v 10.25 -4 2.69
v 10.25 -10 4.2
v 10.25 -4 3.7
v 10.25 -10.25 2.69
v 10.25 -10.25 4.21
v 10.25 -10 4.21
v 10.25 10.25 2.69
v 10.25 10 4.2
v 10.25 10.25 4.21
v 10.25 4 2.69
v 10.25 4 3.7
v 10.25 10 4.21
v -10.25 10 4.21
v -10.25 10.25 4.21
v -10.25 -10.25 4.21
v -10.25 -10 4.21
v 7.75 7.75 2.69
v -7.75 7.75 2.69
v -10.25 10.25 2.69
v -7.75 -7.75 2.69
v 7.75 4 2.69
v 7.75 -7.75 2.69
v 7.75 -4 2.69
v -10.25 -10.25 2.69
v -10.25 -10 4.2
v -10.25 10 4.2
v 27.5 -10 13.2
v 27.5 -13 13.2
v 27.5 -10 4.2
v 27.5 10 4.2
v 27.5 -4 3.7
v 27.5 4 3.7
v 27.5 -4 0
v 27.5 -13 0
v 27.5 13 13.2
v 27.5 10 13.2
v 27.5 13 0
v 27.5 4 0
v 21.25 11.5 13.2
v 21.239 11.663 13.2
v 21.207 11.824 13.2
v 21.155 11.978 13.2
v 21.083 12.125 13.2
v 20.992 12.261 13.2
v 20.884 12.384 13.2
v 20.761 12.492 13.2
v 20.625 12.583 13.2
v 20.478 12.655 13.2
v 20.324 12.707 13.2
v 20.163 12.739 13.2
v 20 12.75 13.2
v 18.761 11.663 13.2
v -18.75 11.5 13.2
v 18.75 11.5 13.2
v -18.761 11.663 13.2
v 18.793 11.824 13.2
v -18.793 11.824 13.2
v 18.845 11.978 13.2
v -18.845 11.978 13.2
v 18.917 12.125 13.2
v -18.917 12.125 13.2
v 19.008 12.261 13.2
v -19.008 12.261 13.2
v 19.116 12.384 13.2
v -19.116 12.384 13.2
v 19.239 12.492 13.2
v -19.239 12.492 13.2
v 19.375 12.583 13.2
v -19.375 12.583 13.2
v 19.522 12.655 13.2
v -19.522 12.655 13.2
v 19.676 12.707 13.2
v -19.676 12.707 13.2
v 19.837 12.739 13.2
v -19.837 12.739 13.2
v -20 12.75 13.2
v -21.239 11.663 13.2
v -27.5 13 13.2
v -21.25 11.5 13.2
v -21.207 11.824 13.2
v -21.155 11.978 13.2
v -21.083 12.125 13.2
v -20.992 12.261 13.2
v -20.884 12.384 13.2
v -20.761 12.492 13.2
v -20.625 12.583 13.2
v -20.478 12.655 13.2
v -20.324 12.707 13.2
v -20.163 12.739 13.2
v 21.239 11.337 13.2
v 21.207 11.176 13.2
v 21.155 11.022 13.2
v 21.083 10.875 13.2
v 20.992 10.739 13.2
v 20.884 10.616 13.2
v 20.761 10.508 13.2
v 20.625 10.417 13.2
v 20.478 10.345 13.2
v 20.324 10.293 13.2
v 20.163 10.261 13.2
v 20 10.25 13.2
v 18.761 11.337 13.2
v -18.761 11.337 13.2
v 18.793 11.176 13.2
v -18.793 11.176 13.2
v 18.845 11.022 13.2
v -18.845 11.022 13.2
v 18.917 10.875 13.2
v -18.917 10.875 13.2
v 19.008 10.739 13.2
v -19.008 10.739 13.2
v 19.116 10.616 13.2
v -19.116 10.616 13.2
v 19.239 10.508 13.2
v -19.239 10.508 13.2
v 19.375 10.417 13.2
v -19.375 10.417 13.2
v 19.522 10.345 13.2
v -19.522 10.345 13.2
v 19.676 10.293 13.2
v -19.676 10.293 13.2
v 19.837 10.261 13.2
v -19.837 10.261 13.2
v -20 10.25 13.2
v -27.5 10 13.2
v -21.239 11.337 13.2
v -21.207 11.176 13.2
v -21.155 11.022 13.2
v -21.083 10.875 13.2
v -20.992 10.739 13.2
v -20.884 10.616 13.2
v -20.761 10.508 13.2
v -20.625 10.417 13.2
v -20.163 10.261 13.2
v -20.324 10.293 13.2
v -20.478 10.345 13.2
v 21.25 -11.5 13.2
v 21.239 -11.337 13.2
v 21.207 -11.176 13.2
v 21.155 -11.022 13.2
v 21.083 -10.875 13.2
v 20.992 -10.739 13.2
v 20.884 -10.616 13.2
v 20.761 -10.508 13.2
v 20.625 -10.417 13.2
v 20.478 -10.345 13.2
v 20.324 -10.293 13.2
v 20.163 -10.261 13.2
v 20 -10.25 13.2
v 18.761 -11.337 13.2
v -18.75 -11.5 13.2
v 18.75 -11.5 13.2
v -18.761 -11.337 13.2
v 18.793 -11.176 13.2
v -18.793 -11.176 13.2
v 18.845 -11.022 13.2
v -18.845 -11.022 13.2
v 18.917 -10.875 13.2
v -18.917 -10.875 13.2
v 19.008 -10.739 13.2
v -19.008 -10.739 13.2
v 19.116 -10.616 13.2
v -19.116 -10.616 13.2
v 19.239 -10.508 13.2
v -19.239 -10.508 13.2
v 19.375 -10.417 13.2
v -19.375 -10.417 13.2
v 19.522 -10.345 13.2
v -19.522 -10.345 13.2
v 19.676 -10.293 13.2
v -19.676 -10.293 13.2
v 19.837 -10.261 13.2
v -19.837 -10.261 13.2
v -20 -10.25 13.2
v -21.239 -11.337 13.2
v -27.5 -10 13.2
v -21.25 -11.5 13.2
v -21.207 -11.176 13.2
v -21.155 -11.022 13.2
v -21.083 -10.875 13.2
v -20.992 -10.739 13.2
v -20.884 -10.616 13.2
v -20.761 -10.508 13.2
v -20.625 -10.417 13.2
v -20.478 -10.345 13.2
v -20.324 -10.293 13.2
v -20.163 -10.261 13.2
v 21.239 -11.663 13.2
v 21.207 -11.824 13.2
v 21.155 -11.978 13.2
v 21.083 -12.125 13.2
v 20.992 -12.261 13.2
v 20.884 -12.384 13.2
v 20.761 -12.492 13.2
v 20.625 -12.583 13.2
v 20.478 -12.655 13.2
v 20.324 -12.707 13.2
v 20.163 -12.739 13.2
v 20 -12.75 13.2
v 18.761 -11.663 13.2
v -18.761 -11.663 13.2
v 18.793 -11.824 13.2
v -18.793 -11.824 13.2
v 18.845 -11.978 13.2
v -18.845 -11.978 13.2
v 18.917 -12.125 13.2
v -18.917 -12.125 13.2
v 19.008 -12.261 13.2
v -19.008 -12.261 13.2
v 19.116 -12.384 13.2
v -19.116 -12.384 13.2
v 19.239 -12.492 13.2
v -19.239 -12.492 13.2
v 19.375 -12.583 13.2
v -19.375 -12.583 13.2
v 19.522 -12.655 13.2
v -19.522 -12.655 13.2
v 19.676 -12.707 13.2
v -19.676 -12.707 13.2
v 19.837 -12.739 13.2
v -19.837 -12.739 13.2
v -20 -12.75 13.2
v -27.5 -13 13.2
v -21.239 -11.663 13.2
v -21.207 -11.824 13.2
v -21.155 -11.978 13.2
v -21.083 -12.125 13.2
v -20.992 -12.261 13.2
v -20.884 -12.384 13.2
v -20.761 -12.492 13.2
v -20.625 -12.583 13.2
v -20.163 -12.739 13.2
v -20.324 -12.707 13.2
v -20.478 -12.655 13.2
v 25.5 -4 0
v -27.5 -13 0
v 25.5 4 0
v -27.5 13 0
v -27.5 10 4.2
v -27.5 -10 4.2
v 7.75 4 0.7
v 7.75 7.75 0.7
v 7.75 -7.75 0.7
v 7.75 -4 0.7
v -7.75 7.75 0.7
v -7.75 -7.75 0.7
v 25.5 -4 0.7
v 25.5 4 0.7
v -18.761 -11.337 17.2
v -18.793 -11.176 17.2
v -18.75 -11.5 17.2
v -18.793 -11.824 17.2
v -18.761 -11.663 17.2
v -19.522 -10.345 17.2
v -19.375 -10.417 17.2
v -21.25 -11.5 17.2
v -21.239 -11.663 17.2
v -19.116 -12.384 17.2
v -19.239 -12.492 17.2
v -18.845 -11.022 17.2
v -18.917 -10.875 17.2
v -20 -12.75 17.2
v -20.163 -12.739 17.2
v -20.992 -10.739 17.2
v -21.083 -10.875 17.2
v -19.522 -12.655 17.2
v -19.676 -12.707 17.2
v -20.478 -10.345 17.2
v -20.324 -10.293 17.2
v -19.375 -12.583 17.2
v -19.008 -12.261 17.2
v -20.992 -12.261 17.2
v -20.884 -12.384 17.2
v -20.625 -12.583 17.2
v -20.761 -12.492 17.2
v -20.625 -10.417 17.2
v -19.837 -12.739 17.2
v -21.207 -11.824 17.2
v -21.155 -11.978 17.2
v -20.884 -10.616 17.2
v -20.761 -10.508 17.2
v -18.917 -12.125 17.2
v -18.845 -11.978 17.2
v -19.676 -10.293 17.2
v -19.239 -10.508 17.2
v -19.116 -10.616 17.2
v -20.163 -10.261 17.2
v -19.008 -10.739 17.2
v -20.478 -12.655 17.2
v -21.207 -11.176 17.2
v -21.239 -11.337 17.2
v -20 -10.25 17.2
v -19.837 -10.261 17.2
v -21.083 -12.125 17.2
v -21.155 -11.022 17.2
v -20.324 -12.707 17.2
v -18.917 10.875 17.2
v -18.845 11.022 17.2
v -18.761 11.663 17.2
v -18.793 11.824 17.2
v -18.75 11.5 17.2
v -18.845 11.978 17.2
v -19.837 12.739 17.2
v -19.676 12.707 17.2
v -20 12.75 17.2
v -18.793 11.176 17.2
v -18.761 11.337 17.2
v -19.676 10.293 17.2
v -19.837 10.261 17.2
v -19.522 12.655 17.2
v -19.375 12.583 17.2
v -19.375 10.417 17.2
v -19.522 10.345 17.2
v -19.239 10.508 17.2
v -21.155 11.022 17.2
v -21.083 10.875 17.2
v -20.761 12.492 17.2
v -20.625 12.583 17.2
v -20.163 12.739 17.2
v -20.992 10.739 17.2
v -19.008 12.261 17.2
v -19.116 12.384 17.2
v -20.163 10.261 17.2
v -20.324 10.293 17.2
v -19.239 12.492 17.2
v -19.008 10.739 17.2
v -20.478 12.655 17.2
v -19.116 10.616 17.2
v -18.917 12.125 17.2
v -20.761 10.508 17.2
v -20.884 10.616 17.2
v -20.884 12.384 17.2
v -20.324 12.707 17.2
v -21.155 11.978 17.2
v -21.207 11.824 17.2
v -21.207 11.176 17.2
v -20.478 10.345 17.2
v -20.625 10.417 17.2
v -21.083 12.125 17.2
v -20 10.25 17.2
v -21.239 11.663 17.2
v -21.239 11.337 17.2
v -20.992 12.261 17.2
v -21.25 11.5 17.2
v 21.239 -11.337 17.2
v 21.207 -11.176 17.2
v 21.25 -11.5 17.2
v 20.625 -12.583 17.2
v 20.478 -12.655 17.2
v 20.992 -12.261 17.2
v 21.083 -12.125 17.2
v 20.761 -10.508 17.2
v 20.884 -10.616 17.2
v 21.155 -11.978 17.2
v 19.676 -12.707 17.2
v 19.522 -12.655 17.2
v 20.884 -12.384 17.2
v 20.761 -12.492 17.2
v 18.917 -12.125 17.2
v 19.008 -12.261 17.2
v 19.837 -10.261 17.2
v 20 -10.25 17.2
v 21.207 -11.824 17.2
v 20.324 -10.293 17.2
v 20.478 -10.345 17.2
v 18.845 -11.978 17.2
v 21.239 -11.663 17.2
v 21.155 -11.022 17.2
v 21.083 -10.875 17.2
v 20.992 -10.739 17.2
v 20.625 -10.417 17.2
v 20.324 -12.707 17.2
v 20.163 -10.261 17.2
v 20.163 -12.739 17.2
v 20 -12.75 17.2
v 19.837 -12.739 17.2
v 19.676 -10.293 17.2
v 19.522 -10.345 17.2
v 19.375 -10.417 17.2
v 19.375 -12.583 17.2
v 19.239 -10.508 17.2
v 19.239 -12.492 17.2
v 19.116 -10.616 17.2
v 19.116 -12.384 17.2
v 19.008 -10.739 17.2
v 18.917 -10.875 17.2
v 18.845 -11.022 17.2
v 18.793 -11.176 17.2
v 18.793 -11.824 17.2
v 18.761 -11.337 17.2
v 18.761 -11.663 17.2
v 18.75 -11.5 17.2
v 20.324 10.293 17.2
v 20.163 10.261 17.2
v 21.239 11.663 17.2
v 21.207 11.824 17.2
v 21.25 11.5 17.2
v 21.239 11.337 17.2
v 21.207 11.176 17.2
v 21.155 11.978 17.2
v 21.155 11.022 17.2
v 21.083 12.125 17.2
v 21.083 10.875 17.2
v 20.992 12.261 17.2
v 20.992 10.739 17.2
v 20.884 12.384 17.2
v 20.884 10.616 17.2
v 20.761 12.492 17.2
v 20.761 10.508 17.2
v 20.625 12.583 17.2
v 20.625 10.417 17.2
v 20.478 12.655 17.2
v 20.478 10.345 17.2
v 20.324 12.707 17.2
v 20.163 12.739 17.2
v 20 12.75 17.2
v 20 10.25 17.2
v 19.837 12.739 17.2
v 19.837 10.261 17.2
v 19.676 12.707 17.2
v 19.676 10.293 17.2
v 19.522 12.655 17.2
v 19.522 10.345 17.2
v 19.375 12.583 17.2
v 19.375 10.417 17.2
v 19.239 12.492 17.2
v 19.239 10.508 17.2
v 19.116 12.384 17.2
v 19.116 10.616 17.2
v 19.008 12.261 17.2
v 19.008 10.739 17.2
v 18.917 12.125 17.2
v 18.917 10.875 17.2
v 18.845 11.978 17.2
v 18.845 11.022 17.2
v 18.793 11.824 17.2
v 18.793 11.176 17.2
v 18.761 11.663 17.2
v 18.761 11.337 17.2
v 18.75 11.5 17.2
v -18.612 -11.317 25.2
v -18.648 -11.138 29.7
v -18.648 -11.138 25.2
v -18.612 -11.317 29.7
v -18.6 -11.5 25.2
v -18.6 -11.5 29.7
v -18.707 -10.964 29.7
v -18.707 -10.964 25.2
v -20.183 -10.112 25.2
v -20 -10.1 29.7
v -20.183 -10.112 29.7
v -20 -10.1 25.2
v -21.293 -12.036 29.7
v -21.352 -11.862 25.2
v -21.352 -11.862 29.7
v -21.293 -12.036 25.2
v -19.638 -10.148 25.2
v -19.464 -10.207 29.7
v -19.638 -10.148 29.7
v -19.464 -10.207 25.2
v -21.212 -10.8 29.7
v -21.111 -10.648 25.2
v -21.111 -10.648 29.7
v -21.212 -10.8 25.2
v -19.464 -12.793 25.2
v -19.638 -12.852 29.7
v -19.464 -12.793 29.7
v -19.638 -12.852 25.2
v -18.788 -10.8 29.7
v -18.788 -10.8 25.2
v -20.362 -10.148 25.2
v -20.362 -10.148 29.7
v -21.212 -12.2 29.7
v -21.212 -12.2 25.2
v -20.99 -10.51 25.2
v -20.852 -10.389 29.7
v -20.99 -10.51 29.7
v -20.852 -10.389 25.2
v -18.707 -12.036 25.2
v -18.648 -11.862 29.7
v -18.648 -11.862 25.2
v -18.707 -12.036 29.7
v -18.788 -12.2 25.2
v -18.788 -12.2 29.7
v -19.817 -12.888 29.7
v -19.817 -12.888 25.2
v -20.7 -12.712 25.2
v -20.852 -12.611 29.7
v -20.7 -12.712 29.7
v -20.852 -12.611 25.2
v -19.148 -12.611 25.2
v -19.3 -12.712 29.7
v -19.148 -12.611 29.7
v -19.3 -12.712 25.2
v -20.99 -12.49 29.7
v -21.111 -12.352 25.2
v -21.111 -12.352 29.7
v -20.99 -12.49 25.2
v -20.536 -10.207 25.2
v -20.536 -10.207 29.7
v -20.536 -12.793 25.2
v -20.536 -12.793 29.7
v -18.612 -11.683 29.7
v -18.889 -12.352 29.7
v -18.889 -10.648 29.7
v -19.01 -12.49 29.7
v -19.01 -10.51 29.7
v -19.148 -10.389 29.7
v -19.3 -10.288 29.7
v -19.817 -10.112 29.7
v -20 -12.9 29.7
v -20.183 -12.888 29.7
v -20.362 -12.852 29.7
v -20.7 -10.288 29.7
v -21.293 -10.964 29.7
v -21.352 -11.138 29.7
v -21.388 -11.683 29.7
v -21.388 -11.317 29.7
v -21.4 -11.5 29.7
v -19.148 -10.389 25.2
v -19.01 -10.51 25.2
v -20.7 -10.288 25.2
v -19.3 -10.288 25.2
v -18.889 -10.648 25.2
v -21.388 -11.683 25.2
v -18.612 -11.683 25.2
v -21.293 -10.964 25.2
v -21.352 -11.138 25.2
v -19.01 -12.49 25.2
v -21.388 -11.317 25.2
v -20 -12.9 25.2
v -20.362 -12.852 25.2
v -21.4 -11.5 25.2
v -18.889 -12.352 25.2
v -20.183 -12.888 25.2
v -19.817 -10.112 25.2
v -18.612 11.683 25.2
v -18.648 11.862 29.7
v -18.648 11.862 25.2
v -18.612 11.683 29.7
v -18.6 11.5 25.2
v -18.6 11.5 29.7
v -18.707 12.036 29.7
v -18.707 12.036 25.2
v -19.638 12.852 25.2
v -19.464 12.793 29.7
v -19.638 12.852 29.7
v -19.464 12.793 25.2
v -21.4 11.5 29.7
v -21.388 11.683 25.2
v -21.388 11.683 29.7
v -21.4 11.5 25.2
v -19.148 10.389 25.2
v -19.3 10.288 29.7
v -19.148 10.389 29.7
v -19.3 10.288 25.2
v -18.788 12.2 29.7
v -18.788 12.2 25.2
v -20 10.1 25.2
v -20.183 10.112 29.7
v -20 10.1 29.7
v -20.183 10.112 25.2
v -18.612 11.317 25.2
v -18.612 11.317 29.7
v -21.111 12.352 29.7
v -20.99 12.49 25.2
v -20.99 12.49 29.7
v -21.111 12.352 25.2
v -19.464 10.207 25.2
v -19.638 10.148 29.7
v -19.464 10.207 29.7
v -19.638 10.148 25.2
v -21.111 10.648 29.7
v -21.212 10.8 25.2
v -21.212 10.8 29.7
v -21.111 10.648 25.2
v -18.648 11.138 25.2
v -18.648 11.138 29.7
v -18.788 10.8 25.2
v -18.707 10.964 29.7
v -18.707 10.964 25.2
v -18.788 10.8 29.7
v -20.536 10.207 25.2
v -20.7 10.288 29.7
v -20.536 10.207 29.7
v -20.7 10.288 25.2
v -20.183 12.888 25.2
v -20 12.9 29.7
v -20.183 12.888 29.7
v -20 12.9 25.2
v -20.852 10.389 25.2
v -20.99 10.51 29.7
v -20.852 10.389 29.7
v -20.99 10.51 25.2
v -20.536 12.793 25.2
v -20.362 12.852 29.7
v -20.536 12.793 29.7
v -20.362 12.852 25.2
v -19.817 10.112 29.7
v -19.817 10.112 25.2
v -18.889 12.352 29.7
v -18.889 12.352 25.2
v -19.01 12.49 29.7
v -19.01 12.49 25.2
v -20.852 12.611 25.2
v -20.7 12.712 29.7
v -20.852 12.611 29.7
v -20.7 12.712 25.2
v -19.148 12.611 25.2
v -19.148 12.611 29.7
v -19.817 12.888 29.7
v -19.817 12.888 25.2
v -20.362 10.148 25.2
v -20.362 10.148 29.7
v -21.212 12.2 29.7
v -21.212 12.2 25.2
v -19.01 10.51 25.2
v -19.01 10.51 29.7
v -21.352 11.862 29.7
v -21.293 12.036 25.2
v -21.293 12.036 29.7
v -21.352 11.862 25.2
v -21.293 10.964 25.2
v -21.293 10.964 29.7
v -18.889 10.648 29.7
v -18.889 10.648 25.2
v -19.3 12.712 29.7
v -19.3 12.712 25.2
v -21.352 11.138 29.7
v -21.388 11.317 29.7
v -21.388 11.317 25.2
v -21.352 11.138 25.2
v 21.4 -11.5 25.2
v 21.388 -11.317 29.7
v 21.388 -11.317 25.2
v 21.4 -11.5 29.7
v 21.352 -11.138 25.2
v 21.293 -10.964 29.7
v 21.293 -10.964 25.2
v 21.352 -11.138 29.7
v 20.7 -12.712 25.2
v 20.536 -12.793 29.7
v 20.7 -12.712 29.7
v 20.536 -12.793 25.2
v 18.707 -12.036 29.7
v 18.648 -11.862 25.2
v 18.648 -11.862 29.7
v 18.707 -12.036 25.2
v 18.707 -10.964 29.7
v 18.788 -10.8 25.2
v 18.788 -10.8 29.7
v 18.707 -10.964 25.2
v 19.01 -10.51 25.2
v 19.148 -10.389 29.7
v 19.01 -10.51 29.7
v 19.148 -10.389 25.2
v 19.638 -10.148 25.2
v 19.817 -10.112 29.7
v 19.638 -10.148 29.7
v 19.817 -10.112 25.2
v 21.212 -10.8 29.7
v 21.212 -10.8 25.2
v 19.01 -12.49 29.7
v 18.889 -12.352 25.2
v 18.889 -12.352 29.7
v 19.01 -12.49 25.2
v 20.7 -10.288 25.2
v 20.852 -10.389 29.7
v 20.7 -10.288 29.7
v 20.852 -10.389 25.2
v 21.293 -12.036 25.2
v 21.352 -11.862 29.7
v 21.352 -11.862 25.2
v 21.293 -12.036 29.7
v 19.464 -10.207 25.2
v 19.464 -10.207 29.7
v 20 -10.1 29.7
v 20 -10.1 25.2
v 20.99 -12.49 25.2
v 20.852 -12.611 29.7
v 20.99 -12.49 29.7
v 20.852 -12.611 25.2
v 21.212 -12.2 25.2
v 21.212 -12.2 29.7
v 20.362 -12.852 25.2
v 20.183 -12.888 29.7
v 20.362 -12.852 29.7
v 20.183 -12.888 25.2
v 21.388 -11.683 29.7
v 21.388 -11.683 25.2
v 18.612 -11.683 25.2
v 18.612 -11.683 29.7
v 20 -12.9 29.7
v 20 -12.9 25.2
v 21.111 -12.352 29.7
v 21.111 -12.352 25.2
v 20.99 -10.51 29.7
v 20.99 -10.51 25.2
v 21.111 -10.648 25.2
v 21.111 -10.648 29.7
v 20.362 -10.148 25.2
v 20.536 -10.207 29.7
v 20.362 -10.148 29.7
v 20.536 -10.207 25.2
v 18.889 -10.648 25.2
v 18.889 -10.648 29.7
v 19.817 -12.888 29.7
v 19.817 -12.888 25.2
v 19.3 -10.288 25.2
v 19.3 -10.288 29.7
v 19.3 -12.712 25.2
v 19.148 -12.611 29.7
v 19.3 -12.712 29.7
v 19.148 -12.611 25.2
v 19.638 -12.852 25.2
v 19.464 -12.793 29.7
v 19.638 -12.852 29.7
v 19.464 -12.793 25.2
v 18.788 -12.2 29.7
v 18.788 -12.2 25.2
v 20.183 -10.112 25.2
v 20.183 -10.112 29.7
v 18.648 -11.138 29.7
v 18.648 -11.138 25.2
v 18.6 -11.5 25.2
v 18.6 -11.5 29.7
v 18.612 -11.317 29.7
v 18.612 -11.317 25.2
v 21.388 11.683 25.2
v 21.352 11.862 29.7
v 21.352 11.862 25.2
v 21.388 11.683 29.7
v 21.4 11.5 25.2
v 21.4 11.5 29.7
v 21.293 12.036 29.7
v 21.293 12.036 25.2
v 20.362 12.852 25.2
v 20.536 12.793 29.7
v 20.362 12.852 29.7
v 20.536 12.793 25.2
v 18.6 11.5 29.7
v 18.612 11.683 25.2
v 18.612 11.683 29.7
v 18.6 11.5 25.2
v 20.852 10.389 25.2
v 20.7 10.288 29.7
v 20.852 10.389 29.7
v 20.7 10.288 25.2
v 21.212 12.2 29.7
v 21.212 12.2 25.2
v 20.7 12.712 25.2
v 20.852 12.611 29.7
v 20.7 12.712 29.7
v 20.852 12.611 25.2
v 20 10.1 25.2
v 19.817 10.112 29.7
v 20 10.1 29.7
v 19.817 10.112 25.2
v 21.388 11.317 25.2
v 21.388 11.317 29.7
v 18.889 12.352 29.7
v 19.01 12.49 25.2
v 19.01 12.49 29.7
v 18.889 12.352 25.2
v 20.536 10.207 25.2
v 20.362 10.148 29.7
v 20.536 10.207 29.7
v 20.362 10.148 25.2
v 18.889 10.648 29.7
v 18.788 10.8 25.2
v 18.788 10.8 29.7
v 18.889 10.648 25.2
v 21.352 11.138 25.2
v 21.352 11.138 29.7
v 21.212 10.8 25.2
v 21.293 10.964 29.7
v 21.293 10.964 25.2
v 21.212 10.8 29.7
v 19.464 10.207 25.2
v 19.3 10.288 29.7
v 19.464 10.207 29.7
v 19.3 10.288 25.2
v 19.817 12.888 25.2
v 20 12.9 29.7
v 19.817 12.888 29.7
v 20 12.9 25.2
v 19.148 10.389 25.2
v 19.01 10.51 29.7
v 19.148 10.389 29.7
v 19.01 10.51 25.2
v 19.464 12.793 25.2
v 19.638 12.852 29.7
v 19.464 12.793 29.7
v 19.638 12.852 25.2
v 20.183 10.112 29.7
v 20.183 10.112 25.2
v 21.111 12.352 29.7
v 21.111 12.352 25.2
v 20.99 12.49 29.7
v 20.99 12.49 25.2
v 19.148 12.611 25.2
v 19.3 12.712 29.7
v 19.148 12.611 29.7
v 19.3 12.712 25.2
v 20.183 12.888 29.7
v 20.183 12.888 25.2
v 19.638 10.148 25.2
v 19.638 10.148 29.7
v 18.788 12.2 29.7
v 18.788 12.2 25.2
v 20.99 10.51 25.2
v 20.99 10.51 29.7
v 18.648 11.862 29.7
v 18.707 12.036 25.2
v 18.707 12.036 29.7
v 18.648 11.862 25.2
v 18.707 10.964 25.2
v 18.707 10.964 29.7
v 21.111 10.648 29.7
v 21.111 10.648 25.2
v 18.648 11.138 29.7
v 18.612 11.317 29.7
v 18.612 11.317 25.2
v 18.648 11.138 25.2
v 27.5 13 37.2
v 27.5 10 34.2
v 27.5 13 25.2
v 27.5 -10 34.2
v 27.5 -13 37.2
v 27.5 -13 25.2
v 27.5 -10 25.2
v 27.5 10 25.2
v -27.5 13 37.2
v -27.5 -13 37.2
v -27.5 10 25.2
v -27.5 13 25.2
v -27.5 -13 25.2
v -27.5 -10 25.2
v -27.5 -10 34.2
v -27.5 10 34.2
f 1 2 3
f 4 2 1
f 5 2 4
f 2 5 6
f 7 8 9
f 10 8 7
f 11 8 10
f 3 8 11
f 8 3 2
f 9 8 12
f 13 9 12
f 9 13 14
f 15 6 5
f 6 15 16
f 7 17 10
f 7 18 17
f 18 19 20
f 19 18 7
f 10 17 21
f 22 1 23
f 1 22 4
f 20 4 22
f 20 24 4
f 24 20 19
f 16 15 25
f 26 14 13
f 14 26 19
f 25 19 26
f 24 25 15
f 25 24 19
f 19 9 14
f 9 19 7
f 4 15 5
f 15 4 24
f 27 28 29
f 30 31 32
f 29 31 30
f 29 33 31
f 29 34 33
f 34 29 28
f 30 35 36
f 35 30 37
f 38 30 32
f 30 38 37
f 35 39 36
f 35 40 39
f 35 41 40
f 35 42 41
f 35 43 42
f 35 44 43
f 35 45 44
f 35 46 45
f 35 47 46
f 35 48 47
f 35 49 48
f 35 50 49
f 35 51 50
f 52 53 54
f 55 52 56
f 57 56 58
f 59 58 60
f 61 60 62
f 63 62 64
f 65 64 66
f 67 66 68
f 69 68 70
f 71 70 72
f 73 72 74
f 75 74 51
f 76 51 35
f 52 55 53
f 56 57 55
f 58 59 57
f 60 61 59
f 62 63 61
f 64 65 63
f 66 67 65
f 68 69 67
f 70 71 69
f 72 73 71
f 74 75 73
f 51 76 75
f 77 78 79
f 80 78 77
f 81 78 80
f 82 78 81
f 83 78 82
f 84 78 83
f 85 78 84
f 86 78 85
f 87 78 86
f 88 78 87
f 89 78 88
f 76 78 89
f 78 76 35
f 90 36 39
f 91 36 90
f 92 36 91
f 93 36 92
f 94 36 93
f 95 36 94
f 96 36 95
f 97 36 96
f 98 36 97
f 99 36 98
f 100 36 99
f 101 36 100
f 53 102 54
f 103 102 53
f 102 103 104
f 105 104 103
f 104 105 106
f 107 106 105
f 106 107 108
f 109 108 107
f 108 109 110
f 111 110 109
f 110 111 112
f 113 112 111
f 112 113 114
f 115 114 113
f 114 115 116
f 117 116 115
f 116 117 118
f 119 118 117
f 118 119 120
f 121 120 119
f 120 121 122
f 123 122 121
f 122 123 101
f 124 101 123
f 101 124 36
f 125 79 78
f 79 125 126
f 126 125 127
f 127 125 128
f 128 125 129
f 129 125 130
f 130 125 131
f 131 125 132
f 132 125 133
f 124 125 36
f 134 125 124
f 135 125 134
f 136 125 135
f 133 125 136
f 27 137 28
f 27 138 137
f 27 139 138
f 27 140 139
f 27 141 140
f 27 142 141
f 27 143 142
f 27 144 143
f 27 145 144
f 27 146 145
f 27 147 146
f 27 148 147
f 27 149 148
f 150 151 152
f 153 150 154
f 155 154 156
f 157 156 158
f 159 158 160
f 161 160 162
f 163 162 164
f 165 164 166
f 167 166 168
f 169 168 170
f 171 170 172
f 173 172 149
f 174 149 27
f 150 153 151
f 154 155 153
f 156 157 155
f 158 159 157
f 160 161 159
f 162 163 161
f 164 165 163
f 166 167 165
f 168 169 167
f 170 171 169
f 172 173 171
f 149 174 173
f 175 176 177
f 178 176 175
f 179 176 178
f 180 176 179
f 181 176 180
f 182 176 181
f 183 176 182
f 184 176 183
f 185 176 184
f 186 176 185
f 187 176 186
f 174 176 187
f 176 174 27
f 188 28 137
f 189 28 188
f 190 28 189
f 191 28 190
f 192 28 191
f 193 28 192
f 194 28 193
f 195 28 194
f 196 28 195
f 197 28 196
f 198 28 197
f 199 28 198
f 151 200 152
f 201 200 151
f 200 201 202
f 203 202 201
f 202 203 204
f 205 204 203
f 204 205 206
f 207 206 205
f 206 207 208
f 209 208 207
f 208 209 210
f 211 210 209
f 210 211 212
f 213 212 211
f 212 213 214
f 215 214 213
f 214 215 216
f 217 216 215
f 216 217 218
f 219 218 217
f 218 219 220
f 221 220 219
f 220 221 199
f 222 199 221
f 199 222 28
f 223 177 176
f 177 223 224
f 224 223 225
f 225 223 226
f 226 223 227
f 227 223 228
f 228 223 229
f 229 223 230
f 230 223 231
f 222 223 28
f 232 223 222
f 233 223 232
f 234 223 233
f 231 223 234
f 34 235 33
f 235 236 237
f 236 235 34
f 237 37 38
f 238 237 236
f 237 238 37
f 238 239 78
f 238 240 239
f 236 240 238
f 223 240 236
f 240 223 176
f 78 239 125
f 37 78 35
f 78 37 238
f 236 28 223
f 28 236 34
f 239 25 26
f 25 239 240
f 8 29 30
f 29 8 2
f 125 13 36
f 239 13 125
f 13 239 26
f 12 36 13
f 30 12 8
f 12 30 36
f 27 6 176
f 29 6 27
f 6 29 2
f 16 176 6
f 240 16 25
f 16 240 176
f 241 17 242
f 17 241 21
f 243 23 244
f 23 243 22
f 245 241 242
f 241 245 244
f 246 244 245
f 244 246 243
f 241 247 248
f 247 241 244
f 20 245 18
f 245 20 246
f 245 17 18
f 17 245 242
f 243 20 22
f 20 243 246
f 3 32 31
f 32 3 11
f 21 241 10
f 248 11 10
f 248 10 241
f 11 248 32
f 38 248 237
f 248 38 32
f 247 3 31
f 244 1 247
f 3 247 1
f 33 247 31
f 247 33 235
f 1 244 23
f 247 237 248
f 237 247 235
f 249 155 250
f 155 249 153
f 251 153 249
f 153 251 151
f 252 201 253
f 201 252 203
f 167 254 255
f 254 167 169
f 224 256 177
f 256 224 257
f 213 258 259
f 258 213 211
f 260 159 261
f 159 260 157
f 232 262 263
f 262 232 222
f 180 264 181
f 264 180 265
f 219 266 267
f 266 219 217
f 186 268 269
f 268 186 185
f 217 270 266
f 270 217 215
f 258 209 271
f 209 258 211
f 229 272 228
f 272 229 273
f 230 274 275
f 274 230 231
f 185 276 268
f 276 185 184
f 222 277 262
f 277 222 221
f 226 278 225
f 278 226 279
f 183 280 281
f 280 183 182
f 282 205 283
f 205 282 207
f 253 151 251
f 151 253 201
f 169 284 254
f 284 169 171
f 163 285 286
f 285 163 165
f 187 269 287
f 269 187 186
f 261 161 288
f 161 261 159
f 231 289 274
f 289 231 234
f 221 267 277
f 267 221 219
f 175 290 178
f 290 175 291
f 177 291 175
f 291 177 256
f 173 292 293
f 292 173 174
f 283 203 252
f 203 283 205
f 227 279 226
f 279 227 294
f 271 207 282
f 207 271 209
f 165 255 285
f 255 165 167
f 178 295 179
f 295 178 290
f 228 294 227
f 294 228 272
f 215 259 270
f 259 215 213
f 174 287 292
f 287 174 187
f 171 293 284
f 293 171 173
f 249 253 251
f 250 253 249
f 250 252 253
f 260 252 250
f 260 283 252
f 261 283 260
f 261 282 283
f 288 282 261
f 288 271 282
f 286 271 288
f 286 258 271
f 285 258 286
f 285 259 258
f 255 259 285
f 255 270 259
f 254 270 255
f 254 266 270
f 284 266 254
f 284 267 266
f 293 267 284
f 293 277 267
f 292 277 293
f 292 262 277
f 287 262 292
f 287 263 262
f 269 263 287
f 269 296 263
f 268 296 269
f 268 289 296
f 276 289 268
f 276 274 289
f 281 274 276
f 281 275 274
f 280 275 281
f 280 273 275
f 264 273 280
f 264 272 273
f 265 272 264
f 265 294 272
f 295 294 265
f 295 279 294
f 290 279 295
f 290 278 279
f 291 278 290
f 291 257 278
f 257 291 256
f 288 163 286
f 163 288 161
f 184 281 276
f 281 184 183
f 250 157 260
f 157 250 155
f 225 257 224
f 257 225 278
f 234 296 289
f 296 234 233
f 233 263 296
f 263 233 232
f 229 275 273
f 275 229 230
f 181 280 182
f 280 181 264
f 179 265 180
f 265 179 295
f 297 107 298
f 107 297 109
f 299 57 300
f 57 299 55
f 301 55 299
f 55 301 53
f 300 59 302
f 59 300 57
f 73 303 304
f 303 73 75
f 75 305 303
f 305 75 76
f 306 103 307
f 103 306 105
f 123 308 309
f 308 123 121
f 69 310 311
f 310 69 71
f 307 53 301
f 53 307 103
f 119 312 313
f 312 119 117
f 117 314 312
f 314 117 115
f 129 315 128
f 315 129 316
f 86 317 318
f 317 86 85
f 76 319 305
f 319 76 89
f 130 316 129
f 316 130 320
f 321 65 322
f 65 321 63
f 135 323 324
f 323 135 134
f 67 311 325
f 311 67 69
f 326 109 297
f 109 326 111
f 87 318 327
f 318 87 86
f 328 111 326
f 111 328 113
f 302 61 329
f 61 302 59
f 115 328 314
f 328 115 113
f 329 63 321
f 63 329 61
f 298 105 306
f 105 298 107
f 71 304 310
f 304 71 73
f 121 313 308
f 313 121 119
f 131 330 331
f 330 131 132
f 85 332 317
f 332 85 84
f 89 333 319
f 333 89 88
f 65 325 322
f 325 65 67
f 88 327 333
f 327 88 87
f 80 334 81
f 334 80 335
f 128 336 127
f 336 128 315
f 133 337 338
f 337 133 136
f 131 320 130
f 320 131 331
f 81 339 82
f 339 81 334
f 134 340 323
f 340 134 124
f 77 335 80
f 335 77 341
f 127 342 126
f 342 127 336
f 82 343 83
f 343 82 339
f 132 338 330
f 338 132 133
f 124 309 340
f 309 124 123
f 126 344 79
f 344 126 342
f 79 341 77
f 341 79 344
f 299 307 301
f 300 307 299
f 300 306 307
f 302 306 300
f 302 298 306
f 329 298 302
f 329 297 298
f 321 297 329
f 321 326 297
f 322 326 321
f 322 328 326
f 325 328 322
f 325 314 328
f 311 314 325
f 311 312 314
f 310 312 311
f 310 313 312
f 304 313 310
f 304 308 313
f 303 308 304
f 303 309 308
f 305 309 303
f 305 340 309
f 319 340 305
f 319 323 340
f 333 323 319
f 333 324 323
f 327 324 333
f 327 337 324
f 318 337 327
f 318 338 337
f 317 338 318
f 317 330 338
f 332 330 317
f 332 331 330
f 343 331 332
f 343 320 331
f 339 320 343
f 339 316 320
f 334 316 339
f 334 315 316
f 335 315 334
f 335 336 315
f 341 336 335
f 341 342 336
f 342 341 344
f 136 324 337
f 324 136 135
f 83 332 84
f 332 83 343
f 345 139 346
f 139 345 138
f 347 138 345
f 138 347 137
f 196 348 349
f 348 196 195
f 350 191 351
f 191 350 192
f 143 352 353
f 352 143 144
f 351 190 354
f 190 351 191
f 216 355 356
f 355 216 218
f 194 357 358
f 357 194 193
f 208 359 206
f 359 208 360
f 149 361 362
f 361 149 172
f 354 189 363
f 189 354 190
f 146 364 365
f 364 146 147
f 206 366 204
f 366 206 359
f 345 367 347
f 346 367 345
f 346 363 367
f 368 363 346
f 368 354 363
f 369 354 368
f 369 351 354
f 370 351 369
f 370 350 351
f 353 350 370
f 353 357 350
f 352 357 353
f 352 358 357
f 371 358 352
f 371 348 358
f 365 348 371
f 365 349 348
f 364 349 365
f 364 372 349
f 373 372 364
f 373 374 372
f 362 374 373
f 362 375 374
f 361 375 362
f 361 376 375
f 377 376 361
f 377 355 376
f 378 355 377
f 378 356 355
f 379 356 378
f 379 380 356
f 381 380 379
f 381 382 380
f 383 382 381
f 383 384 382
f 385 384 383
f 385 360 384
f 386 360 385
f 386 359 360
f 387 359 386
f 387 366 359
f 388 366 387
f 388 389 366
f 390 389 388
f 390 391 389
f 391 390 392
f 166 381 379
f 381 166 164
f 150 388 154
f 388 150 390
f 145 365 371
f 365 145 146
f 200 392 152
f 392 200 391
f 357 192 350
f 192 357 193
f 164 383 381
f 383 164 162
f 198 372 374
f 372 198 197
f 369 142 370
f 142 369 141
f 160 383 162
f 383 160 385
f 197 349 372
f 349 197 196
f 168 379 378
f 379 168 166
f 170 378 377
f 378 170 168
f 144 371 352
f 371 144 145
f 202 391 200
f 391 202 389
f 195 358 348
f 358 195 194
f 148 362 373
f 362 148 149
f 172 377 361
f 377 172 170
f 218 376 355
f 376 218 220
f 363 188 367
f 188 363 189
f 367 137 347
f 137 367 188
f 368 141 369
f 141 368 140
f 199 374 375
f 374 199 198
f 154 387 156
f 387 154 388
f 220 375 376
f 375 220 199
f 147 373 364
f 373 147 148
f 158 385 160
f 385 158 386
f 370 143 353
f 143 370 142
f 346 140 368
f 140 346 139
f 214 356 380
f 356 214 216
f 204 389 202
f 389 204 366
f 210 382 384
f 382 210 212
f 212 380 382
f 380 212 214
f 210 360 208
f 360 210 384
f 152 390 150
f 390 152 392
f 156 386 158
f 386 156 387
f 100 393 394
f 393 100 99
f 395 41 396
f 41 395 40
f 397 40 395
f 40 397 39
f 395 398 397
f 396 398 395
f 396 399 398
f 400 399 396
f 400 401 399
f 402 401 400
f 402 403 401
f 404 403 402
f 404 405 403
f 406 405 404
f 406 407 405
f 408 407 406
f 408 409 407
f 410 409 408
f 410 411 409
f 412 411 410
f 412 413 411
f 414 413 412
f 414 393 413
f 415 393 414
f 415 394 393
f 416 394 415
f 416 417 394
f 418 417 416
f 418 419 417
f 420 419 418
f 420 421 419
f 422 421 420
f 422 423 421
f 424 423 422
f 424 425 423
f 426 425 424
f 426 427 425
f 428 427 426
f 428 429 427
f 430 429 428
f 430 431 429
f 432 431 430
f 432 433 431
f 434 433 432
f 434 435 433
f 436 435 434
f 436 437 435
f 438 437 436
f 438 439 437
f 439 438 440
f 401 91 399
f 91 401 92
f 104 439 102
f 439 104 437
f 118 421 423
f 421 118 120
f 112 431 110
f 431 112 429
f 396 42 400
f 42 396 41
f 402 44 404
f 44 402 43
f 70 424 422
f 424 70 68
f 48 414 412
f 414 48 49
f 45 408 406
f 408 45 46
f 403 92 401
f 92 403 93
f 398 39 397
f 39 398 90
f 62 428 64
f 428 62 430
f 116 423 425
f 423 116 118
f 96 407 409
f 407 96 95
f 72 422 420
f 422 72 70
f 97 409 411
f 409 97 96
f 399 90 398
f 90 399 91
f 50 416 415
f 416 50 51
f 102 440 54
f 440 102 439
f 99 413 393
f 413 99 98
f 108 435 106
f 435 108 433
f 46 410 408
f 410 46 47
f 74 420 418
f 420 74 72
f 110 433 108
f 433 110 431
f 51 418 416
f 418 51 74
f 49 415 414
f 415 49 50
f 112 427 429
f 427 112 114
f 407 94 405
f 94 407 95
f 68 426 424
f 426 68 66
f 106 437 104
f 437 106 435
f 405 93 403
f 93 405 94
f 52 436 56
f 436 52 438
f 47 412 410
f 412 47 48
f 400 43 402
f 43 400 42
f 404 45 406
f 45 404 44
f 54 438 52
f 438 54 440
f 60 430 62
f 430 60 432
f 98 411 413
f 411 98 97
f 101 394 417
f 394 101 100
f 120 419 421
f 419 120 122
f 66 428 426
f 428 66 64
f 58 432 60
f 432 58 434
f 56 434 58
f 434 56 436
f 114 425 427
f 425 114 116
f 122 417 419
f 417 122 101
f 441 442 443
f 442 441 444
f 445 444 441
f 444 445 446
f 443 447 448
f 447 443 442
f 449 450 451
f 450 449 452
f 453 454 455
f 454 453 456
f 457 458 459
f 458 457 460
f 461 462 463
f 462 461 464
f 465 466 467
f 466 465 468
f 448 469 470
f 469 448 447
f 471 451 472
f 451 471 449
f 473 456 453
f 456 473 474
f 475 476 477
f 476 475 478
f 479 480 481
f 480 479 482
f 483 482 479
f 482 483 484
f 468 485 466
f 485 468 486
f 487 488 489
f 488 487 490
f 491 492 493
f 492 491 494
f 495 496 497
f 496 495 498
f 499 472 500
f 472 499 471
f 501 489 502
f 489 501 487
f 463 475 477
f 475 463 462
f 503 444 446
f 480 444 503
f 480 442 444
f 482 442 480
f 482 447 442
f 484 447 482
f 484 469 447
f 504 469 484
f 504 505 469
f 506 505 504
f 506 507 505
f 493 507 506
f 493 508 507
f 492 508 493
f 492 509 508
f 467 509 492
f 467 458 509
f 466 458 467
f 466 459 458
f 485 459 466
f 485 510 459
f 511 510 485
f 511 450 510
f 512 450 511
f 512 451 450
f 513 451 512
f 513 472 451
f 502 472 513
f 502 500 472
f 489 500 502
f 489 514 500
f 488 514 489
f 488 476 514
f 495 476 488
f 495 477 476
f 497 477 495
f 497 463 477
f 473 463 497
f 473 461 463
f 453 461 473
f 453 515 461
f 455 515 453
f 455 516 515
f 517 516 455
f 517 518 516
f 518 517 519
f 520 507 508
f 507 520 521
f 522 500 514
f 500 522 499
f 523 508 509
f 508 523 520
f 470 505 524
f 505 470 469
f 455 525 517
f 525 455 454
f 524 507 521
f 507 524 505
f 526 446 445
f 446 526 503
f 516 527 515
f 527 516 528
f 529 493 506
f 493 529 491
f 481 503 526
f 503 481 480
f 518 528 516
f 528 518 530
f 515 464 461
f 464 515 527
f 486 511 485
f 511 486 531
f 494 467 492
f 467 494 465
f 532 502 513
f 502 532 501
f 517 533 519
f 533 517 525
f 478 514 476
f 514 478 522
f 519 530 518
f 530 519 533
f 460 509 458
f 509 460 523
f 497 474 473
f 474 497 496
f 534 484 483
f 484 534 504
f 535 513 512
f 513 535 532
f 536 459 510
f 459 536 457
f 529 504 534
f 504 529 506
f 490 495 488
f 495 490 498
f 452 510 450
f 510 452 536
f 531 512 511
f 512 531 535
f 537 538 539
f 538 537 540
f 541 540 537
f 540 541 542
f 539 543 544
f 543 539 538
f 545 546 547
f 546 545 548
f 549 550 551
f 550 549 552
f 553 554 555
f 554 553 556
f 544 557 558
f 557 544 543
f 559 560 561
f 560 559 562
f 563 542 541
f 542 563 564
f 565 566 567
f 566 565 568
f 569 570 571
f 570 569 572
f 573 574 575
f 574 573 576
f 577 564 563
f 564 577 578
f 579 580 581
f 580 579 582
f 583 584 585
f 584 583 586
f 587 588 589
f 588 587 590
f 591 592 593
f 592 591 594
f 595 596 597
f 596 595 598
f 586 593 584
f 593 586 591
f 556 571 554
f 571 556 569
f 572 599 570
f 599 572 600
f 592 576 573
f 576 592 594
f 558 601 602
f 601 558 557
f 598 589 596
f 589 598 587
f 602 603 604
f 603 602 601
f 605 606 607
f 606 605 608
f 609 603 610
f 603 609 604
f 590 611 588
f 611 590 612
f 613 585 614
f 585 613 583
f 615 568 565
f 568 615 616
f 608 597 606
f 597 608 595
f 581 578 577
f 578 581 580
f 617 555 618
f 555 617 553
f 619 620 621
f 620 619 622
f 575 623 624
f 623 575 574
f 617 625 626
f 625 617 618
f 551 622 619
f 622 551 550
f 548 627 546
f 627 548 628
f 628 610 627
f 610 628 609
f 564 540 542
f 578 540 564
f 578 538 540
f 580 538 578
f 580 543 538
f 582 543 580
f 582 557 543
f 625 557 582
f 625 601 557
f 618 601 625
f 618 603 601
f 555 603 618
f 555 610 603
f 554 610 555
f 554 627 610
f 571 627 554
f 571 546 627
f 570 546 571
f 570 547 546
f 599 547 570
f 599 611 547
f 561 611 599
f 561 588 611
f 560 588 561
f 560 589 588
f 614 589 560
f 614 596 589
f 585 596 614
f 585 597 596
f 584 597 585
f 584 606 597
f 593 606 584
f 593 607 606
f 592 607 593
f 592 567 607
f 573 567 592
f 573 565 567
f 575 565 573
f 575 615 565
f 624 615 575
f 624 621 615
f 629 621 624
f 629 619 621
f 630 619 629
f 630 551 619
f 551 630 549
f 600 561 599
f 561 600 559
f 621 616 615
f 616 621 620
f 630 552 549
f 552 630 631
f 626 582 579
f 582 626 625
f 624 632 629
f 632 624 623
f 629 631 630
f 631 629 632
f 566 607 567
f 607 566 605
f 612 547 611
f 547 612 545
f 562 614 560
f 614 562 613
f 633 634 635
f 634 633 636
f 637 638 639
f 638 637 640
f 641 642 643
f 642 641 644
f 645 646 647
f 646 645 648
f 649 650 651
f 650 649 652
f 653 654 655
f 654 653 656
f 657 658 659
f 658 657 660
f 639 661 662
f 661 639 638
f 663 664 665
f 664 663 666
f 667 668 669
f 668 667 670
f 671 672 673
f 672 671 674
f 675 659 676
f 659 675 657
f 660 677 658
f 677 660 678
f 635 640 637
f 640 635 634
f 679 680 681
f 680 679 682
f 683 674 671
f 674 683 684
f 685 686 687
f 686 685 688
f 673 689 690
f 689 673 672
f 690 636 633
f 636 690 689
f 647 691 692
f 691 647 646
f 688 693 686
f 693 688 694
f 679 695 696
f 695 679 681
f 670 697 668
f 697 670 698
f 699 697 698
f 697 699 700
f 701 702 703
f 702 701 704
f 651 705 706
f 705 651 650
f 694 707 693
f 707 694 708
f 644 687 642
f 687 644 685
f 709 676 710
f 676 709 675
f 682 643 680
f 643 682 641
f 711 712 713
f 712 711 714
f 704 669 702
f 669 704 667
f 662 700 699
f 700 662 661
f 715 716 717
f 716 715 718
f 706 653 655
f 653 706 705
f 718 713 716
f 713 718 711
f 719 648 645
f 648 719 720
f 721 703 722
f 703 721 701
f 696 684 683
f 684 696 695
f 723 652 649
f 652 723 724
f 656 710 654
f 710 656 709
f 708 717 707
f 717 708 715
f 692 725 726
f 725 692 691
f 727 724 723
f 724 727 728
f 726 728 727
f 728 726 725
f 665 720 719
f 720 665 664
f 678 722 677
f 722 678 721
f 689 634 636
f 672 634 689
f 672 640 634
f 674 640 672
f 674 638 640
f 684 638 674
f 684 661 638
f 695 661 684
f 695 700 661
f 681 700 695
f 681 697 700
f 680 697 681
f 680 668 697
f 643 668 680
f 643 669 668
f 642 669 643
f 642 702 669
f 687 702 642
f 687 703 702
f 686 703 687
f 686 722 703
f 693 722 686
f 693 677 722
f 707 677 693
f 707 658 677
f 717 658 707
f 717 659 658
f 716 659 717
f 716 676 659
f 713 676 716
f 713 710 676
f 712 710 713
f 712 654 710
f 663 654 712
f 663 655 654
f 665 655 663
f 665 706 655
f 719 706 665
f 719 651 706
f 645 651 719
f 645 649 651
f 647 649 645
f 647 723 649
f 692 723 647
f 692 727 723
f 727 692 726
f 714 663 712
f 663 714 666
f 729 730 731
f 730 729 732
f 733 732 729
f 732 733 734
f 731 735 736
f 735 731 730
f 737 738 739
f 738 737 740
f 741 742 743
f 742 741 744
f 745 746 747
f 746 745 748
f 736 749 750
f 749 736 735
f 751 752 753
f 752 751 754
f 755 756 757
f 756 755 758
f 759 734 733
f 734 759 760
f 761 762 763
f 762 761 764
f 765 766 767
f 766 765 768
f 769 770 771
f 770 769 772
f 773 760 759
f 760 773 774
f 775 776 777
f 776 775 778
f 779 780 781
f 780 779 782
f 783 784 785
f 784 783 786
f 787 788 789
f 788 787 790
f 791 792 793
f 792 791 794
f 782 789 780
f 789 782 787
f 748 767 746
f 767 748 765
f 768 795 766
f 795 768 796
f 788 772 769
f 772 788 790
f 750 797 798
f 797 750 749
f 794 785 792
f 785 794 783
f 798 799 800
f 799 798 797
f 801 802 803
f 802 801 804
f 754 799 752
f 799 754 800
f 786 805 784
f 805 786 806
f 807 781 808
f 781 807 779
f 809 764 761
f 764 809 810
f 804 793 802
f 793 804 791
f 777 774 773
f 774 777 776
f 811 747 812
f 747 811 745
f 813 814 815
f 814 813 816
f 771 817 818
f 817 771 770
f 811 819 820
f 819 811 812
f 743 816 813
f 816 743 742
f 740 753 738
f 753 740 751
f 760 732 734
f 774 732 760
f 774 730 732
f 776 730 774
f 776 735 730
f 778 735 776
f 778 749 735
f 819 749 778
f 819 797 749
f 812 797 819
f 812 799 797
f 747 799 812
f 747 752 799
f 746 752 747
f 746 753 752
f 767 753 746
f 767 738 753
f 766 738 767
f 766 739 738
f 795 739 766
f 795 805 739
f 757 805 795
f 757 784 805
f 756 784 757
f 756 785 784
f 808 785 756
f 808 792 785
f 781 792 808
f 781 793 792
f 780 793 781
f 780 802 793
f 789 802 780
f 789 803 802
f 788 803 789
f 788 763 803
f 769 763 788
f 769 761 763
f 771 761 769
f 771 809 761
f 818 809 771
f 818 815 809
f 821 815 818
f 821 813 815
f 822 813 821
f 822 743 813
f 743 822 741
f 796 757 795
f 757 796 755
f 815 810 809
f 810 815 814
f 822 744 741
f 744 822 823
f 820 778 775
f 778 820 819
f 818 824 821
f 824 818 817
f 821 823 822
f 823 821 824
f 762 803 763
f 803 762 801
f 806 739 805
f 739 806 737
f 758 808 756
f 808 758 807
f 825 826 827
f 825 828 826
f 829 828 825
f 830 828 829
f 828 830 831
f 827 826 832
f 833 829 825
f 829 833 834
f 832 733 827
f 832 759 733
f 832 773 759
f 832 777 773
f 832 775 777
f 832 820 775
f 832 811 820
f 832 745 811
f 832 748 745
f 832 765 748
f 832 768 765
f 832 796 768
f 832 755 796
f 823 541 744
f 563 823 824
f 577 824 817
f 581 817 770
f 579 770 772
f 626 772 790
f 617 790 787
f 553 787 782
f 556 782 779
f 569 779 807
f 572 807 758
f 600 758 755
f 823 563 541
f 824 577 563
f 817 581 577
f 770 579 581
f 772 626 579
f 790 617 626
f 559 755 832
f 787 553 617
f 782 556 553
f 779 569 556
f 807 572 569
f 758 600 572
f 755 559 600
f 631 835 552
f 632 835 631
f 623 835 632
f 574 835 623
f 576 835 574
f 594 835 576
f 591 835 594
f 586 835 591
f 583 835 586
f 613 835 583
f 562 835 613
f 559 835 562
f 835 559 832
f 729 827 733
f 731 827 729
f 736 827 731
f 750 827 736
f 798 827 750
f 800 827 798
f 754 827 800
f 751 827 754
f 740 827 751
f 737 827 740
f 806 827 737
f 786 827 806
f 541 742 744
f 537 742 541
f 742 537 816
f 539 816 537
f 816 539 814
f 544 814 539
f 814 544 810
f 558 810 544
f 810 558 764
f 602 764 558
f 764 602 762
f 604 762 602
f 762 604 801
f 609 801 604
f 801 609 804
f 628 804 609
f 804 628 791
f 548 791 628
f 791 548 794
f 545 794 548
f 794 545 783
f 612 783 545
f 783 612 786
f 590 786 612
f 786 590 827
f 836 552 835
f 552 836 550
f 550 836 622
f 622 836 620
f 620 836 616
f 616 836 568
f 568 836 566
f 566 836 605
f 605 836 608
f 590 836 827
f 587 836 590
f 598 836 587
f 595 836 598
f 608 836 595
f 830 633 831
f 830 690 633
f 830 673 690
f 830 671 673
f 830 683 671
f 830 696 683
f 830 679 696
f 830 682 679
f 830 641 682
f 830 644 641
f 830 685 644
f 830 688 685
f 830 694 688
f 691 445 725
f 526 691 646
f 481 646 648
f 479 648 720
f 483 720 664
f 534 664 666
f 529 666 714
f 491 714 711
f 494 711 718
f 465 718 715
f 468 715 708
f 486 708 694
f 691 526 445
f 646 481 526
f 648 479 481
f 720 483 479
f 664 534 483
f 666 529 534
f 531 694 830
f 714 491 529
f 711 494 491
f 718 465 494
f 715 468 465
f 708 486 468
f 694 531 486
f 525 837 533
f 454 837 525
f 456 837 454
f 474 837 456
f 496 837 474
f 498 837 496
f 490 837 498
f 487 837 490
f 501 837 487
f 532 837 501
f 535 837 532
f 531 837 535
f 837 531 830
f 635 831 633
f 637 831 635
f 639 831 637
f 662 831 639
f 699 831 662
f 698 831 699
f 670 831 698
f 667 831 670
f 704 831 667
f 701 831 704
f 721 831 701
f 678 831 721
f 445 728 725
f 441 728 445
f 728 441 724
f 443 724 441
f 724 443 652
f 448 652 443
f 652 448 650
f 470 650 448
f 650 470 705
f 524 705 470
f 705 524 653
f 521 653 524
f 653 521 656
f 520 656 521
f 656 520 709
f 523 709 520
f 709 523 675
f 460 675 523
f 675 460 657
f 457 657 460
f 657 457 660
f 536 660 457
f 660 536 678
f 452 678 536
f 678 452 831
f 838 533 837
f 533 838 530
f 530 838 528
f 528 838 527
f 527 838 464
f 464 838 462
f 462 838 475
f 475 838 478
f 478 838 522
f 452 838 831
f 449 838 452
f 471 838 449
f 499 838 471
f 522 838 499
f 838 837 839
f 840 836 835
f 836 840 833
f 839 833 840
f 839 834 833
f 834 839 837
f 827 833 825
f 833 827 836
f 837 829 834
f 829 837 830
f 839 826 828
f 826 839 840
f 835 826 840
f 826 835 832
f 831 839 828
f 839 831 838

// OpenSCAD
// =============================================================================
// max30102_reflective_cradle.scad
//
// A light-tight, reflective finger cradle for the MAX30102 / GY-MAX30102.
//
// The MAX30102 is a REFLECTIVE sensor (LED + photodiode side by side), so the
// sensor sits against the finger PAD and the shell blocks ambient light from
// every other direction. This is the reflective analogue of the transmissive
// clip on a medical pulse oximeter.
//
// Two printed parts:
//   * bottom: the U-channel, sensor pocket, gasket groove, cable channel and
//     alignment pins. The module drops into the pocket from the CHANNEL side
//     (top), so there is no large bridge over the cavity.
//   * top:    the matching lid. PRINT IT ROOF-DOWN (rotate 180 deg about X in
//     the slicer) so the 20 mm channel is not a bridge.
//
// Print in MATTE BLACK PLA/PETG (never clear/translucent - it pipes light),
// 0.2 mm layers, 3 perimeters, 20-30% infill. A velcro strap around the middle
// holds the halves; closed-cell foam rings seal the gasket groove and the two
// finger openings.
//
// Set `part` below and export each STL:
//   part = "bottom";  -> bottom.stl
//   part = "top";     -> top.stl
//   part = "both";    -> preview only
// =============================================================================

$fn = 48;

/* ---- finger / shell ------------------------------------------------------ */
finger_w   = 20.0;   // channel width, mm   (measure your finger)
finger_h   = 18.0;   // channel height, mm
length     = 55.0;   // along the finger, mm
wall       = 3.0;    // shell thickness, mm

/* ---- MAX30102 breakout (GY-MAX30102 is ~15.5 x 15.5) --------------------- */
sensor_l   = 15.5;   // along finger, mm
sensor_w   = 15.5;   // across finger, mm
sensor_t   = 3.2;    // module thickness, mm

/* ---- details ------------------------------------------------------------- */
floor_t    = sensor_t + 1.0;         // floor thickness above the pocket (4.2)
half_h     = finger_h / 2.0;
bottom_h   = half_h + floor_t;
top_h      = half_h + wall;
out_w      = finger_w + 2.0 * wall;

pocket_h   = sensor_t + 0.3;         // pocket depth, module + clearance
pocket_z   = floor_t - pocket_h;     // pocket floor z (0.7)
gasket_w   = 2.5;                    // foam-ring width
gasket_d   = 1.5;                    // groove depth

pin_d      = 2.5;
pin_h      = 4.0;
pin_x      = 20.0;
pin_y      = out_w / 2.0 - wall / 2.0;

cable_w    = 8.0;
cable_h    = 3.0;

part       = "both";   // "bottom" | "top" | "both"

/* ========================================================================== */
module bottom() {
    difference() {
        // shell
        translate([-length / 2.0, -out_w / 2.0, 0])
            cube([length, out_w, bottom_h]);

        // finger channel (the bottom half of the finger)
        translate([-length / 2.0 - 1, -finger_w / 2.0, floor_t])
            cube([length + 2, finger_w, half_h + 1]);

        // sensor pocket, open to the channel (module drops in from the top)
        translate([-sensor_l / 2.0, -sensor_w / 2.0, pocket_z])
            cube([sensor_l, sensor_w, pocket_h + 0.1]);

        // foam-gasket groove around the pocket (inner face offset 0.1 mm so it
        // does not coincide with the pocket wall - coincident faces are what
        // makes OpenSCAD report a non-manifold)
        translate([0, 0, floor_t - gasket_d / 2.0])
            difference() {
                cube([sensor_l + 2 * gasket_w,
                      sensor_w + 2 * gasket_w,
                      gasket_d + 0.02], center = true);
                cube([sensor_l - 0.1, sensor_w - 0.1, gasket_d + 0.04], center = true);
            }

        // cable slot from the pocket to the back
        translate([sensor_l / 2.0, -cable_w / 2.0, pocket_z])
            cube([length / 2.0 - sensor_l / 2.0 + 1, cable_w, cable_h]);

        // cable exit through the back wall
        translate([length / 2.0 - 2.0, -cable_w / 2.0, 0])
            cube([3, cable_w, cable_h]);
    }

    // alignment pins (embedded 1 mm into the shell so the union is one solid)
    for (sx = [-1, 1], sy = [-1, 1])
        translate([sx * pin_x, sy * pin_y, bottom_h - 1])
            cylinder(d = pin_d, h = pin_h + 1);
}

module top() {
    difference() {
        // lid shell
        translate([-length / 2.0, -out_w / 2.0, 0])
            cube([length, out_w, top_h]);

        // finger channel (the top half of the finger)
        translate([-length / 2.0 - 1, -finger_w / 2.0, -1])
            cube([length + 2, finger_w, half_h + 1]);

        // alignment holes
        for (sx = [-1, 1], sy = [-1, 1])
            translate([sx * pin_x, sy * pin_y, -0.5])
                cylinder(d = pin_d + 0.3, h = pin_h + 1);
    }
}

/* ========================================================================== */
if (part == "bottom") {
    bottom();
} else if (part == "top") {
    top();
} else {
    bottom();
    translate([0, 0, bottom_h + 12])
        top();
}
